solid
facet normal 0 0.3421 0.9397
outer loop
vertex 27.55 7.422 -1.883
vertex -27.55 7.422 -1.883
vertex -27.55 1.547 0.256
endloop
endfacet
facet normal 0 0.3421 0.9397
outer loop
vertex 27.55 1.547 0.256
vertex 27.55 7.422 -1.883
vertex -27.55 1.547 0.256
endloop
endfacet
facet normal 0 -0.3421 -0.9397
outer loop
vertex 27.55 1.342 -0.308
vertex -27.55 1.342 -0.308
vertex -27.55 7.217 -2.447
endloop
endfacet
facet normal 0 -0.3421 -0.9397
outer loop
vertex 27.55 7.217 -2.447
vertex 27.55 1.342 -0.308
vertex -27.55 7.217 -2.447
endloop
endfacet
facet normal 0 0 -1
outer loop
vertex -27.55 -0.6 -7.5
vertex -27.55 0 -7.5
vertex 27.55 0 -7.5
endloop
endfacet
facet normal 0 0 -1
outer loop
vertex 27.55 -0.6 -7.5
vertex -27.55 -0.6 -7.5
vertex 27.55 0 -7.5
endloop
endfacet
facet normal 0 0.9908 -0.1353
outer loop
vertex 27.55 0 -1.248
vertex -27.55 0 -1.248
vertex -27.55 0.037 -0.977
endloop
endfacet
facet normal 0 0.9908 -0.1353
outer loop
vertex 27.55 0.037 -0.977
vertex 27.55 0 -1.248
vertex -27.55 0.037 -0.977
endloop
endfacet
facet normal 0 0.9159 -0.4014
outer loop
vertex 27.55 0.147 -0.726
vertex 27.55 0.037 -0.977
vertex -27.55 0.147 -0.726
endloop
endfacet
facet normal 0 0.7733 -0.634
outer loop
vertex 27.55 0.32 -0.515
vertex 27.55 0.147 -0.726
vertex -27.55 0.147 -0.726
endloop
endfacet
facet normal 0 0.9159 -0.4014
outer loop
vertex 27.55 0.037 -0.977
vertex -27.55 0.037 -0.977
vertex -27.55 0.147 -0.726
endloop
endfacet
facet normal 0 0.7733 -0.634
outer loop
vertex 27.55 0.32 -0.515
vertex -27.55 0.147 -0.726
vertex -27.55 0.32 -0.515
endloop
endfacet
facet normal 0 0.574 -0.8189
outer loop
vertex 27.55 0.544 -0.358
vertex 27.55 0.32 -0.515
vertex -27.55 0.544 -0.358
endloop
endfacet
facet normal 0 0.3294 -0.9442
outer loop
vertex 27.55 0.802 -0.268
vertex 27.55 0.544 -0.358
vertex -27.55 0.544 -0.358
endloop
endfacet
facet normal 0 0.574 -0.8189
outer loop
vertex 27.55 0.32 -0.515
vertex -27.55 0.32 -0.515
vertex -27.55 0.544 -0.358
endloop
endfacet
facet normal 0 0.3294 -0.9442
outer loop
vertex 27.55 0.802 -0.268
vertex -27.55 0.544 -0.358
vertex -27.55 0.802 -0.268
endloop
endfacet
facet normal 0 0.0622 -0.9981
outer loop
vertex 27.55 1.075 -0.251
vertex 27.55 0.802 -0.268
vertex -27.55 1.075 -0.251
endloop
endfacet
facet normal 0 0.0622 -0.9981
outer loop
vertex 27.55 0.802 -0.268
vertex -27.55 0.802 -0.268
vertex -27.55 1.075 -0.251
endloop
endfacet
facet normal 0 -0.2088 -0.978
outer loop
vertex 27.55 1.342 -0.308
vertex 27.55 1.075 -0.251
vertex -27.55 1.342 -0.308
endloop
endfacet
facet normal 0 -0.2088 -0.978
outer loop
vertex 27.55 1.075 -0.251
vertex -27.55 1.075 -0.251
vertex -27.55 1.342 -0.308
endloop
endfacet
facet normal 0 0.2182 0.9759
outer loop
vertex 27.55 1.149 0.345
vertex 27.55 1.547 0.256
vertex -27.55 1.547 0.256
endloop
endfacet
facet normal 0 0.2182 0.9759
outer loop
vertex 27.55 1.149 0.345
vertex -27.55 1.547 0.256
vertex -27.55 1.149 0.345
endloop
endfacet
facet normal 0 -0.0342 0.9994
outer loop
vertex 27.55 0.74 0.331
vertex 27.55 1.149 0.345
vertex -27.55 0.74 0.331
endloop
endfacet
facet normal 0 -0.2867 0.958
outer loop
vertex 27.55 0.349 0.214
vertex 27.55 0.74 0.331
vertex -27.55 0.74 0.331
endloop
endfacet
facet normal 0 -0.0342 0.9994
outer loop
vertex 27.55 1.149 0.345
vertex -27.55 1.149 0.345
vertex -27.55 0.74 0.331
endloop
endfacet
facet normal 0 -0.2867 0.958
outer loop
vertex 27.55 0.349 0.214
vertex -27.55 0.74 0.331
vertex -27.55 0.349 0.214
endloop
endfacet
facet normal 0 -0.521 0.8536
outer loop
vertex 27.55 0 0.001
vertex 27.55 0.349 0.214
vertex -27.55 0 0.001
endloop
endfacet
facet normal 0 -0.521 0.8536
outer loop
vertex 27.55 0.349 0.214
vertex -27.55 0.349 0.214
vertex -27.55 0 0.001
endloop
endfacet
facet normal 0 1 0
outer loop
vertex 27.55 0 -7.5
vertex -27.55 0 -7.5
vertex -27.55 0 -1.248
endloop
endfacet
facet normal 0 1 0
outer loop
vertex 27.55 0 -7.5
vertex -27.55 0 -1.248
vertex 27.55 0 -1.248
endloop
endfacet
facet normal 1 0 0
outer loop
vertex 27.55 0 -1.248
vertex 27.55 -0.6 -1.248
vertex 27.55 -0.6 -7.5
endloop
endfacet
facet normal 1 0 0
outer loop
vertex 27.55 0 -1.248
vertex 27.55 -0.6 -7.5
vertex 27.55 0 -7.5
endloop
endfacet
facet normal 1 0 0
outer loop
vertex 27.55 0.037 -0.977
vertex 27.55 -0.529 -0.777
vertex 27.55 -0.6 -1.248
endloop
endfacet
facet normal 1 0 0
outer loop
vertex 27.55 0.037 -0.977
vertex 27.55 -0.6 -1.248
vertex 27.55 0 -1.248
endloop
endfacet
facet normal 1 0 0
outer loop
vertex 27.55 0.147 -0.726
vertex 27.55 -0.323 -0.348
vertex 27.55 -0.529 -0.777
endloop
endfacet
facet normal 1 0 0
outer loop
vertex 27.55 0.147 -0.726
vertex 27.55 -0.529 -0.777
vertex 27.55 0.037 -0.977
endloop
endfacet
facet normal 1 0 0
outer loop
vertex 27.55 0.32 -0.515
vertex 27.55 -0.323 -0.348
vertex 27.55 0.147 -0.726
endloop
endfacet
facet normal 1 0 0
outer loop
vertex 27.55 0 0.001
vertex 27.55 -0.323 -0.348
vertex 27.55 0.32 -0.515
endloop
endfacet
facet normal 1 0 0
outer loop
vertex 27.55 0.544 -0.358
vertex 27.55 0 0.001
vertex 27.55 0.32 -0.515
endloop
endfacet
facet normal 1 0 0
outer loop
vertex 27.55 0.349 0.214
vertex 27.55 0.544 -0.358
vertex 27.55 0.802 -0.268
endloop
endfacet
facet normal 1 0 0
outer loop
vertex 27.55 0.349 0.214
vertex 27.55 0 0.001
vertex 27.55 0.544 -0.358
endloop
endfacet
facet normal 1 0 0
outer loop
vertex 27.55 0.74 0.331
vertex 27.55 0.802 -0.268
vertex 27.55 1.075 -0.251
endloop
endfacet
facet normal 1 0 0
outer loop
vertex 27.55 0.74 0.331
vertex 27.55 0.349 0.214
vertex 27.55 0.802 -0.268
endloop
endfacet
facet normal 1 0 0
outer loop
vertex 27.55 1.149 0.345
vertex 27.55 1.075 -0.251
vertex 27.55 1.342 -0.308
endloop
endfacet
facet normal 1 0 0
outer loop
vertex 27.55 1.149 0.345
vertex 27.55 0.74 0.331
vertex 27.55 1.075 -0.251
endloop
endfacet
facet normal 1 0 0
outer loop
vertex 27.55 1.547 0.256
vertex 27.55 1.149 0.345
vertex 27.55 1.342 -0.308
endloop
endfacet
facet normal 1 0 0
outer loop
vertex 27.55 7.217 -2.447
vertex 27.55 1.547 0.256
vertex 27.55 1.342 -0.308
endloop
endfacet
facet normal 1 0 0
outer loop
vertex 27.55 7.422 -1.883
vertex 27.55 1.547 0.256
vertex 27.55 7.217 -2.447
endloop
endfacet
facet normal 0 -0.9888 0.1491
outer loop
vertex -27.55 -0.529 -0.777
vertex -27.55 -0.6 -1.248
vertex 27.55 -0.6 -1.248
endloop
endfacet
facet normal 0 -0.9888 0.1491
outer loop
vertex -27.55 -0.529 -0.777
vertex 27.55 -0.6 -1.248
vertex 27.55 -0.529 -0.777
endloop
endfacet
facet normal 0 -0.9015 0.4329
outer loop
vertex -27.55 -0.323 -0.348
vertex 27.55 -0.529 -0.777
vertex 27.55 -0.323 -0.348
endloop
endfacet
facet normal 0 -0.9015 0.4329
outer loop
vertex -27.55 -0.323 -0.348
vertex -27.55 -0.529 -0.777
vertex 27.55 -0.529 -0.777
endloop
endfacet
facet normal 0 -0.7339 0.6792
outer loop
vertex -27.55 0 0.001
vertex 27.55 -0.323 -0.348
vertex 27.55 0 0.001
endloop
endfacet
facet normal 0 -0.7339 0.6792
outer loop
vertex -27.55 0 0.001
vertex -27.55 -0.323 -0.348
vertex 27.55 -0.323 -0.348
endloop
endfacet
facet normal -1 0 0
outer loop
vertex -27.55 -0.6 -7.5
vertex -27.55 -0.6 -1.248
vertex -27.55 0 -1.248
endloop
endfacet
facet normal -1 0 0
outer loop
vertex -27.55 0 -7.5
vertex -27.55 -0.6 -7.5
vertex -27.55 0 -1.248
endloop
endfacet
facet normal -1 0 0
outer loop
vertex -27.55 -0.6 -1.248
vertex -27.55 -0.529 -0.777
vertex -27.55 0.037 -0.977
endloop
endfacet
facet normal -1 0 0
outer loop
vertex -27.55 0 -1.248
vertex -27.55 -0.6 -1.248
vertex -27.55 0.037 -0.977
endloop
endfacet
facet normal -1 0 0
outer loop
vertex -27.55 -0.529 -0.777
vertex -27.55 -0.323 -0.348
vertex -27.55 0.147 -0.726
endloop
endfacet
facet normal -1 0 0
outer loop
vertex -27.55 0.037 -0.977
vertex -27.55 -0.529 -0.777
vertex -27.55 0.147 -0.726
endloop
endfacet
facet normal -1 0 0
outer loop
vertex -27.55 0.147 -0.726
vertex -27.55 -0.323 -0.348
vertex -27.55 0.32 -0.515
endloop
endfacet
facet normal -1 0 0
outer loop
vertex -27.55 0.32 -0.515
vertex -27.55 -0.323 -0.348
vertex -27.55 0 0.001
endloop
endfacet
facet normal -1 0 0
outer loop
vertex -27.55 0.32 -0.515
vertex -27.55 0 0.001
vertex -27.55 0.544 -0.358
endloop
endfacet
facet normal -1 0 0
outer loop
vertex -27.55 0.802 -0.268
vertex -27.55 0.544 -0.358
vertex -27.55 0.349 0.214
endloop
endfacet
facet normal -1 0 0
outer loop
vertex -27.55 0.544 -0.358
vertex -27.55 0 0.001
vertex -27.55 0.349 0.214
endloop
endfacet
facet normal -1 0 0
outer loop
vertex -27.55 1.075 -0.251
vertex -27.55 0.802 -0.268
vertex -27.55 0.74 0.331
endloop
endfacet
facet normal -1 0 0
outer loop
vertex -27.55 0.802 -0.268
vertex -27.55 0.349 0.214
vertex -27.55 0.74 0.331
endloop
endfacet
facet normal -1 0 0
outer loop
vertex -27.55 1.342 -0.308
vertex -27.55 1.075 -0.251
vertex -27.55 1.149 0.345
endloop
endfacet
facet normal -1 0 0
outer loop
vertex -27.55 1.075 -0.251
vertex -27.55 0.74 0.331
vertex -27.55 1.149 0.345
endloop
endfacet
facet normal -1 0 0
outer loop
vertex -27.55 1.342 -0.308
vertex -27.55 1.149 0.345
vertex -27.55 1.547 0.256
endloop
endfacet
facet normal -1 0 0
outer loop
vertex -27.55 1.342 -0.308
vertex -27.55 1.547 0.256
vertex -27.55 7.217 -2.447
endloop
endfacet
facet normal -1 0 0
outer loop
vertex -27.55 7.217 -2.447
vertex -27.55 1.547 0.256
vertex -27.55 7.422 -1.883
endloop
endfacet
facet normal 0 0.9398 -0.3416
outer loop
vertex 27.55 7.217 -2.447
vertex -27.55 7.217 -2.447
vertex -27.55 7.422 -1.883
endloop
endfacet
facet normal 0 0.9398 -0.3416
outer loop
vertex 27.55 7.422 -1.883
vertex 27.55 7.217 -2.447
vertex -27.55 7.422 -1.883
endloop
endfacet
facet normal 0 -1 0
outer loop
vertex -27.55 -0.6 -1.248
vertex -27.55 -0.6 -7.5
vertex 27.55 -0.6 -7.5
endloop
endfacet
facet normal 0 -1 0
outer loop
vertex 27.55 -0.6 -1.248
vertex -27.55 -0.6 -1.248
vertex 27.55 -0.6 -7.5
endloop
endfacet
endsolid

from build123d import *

# Parameters (mm, degrees)
SKETCH5_W              = 55.1
SKETCH5_H              = 15
BASE_FLANGE1_DEPTH     = 0.6
SKETCHED_START         = -27.55
SKETCHED_BEND2_DEPTH   = 55.1
SKETCHED_BEND2_2_DEPTH = 55.1


# Read off the part's stored shape, not the designer's step: Sketched Bend2
# Sheet-metal steps are written as plain solids
with BuildPart() as part:
    # Sketch5 → Base-Flange1 (new body)
    with BuildSketch(Plane(origin=(0, 0, 0), x_dir=(1, 0, 0), z_dir=(0, 1, 0))):
        Rectangle(SKETCH5_W, SKETCH5_H)
    extrude(amount=-BASE_FLANGE1_DEPTH)

    # Sketched Bend2 outline → Sketched Bend2 (cut)
    with BuildSketch(Plane.YZ.offset(SKETCHED_START)):
        with BuildLine():
            ThreePointArc((-0.6, -1.247910415), (-0.44222051, -0.555090092), (0, 0.001089185))
            Line((0, 0.001089185), (0, 7.5))
            Line((0, 7.5), (-0.6, 7.5))
            Line((-0.6, 7.5), (-0.6, -1.247910415))
        make_face()
    extrude(amount=SKETCHED_BEND2_DEPTH, mode=Mode.SUBTRACT)

    # Sketched Bend2 2 outline → Sketched Bend2 2 (add)
    with BuildSketch(Plane.YZ.offset(SKETCHED_START)):
        with BuildLine():
            Line((7.217062591, -2.44655837), (7.422274677, -1.882742798))
            Line((7.422274677, -1.882742798), (1.547232229, 0.255597778))
            ThreePointArc((1.547232229, 0.255597778), (0.740301483, 0.330872876), (0, 0.001089185))
            Line((0, 0.001089185), (0, -1.247910415))
            ThreePointArc((0, -1.247910415), (0.426423564, -0.428758371), (1.342020143, -0.308217794))
            Line((1.342020143, -0.308217794), (7.217062591, -2.44655837))
        make_face()
    extrude(amount=SKETCHED_BEND2_2_DEPTH)


solid = part.part
